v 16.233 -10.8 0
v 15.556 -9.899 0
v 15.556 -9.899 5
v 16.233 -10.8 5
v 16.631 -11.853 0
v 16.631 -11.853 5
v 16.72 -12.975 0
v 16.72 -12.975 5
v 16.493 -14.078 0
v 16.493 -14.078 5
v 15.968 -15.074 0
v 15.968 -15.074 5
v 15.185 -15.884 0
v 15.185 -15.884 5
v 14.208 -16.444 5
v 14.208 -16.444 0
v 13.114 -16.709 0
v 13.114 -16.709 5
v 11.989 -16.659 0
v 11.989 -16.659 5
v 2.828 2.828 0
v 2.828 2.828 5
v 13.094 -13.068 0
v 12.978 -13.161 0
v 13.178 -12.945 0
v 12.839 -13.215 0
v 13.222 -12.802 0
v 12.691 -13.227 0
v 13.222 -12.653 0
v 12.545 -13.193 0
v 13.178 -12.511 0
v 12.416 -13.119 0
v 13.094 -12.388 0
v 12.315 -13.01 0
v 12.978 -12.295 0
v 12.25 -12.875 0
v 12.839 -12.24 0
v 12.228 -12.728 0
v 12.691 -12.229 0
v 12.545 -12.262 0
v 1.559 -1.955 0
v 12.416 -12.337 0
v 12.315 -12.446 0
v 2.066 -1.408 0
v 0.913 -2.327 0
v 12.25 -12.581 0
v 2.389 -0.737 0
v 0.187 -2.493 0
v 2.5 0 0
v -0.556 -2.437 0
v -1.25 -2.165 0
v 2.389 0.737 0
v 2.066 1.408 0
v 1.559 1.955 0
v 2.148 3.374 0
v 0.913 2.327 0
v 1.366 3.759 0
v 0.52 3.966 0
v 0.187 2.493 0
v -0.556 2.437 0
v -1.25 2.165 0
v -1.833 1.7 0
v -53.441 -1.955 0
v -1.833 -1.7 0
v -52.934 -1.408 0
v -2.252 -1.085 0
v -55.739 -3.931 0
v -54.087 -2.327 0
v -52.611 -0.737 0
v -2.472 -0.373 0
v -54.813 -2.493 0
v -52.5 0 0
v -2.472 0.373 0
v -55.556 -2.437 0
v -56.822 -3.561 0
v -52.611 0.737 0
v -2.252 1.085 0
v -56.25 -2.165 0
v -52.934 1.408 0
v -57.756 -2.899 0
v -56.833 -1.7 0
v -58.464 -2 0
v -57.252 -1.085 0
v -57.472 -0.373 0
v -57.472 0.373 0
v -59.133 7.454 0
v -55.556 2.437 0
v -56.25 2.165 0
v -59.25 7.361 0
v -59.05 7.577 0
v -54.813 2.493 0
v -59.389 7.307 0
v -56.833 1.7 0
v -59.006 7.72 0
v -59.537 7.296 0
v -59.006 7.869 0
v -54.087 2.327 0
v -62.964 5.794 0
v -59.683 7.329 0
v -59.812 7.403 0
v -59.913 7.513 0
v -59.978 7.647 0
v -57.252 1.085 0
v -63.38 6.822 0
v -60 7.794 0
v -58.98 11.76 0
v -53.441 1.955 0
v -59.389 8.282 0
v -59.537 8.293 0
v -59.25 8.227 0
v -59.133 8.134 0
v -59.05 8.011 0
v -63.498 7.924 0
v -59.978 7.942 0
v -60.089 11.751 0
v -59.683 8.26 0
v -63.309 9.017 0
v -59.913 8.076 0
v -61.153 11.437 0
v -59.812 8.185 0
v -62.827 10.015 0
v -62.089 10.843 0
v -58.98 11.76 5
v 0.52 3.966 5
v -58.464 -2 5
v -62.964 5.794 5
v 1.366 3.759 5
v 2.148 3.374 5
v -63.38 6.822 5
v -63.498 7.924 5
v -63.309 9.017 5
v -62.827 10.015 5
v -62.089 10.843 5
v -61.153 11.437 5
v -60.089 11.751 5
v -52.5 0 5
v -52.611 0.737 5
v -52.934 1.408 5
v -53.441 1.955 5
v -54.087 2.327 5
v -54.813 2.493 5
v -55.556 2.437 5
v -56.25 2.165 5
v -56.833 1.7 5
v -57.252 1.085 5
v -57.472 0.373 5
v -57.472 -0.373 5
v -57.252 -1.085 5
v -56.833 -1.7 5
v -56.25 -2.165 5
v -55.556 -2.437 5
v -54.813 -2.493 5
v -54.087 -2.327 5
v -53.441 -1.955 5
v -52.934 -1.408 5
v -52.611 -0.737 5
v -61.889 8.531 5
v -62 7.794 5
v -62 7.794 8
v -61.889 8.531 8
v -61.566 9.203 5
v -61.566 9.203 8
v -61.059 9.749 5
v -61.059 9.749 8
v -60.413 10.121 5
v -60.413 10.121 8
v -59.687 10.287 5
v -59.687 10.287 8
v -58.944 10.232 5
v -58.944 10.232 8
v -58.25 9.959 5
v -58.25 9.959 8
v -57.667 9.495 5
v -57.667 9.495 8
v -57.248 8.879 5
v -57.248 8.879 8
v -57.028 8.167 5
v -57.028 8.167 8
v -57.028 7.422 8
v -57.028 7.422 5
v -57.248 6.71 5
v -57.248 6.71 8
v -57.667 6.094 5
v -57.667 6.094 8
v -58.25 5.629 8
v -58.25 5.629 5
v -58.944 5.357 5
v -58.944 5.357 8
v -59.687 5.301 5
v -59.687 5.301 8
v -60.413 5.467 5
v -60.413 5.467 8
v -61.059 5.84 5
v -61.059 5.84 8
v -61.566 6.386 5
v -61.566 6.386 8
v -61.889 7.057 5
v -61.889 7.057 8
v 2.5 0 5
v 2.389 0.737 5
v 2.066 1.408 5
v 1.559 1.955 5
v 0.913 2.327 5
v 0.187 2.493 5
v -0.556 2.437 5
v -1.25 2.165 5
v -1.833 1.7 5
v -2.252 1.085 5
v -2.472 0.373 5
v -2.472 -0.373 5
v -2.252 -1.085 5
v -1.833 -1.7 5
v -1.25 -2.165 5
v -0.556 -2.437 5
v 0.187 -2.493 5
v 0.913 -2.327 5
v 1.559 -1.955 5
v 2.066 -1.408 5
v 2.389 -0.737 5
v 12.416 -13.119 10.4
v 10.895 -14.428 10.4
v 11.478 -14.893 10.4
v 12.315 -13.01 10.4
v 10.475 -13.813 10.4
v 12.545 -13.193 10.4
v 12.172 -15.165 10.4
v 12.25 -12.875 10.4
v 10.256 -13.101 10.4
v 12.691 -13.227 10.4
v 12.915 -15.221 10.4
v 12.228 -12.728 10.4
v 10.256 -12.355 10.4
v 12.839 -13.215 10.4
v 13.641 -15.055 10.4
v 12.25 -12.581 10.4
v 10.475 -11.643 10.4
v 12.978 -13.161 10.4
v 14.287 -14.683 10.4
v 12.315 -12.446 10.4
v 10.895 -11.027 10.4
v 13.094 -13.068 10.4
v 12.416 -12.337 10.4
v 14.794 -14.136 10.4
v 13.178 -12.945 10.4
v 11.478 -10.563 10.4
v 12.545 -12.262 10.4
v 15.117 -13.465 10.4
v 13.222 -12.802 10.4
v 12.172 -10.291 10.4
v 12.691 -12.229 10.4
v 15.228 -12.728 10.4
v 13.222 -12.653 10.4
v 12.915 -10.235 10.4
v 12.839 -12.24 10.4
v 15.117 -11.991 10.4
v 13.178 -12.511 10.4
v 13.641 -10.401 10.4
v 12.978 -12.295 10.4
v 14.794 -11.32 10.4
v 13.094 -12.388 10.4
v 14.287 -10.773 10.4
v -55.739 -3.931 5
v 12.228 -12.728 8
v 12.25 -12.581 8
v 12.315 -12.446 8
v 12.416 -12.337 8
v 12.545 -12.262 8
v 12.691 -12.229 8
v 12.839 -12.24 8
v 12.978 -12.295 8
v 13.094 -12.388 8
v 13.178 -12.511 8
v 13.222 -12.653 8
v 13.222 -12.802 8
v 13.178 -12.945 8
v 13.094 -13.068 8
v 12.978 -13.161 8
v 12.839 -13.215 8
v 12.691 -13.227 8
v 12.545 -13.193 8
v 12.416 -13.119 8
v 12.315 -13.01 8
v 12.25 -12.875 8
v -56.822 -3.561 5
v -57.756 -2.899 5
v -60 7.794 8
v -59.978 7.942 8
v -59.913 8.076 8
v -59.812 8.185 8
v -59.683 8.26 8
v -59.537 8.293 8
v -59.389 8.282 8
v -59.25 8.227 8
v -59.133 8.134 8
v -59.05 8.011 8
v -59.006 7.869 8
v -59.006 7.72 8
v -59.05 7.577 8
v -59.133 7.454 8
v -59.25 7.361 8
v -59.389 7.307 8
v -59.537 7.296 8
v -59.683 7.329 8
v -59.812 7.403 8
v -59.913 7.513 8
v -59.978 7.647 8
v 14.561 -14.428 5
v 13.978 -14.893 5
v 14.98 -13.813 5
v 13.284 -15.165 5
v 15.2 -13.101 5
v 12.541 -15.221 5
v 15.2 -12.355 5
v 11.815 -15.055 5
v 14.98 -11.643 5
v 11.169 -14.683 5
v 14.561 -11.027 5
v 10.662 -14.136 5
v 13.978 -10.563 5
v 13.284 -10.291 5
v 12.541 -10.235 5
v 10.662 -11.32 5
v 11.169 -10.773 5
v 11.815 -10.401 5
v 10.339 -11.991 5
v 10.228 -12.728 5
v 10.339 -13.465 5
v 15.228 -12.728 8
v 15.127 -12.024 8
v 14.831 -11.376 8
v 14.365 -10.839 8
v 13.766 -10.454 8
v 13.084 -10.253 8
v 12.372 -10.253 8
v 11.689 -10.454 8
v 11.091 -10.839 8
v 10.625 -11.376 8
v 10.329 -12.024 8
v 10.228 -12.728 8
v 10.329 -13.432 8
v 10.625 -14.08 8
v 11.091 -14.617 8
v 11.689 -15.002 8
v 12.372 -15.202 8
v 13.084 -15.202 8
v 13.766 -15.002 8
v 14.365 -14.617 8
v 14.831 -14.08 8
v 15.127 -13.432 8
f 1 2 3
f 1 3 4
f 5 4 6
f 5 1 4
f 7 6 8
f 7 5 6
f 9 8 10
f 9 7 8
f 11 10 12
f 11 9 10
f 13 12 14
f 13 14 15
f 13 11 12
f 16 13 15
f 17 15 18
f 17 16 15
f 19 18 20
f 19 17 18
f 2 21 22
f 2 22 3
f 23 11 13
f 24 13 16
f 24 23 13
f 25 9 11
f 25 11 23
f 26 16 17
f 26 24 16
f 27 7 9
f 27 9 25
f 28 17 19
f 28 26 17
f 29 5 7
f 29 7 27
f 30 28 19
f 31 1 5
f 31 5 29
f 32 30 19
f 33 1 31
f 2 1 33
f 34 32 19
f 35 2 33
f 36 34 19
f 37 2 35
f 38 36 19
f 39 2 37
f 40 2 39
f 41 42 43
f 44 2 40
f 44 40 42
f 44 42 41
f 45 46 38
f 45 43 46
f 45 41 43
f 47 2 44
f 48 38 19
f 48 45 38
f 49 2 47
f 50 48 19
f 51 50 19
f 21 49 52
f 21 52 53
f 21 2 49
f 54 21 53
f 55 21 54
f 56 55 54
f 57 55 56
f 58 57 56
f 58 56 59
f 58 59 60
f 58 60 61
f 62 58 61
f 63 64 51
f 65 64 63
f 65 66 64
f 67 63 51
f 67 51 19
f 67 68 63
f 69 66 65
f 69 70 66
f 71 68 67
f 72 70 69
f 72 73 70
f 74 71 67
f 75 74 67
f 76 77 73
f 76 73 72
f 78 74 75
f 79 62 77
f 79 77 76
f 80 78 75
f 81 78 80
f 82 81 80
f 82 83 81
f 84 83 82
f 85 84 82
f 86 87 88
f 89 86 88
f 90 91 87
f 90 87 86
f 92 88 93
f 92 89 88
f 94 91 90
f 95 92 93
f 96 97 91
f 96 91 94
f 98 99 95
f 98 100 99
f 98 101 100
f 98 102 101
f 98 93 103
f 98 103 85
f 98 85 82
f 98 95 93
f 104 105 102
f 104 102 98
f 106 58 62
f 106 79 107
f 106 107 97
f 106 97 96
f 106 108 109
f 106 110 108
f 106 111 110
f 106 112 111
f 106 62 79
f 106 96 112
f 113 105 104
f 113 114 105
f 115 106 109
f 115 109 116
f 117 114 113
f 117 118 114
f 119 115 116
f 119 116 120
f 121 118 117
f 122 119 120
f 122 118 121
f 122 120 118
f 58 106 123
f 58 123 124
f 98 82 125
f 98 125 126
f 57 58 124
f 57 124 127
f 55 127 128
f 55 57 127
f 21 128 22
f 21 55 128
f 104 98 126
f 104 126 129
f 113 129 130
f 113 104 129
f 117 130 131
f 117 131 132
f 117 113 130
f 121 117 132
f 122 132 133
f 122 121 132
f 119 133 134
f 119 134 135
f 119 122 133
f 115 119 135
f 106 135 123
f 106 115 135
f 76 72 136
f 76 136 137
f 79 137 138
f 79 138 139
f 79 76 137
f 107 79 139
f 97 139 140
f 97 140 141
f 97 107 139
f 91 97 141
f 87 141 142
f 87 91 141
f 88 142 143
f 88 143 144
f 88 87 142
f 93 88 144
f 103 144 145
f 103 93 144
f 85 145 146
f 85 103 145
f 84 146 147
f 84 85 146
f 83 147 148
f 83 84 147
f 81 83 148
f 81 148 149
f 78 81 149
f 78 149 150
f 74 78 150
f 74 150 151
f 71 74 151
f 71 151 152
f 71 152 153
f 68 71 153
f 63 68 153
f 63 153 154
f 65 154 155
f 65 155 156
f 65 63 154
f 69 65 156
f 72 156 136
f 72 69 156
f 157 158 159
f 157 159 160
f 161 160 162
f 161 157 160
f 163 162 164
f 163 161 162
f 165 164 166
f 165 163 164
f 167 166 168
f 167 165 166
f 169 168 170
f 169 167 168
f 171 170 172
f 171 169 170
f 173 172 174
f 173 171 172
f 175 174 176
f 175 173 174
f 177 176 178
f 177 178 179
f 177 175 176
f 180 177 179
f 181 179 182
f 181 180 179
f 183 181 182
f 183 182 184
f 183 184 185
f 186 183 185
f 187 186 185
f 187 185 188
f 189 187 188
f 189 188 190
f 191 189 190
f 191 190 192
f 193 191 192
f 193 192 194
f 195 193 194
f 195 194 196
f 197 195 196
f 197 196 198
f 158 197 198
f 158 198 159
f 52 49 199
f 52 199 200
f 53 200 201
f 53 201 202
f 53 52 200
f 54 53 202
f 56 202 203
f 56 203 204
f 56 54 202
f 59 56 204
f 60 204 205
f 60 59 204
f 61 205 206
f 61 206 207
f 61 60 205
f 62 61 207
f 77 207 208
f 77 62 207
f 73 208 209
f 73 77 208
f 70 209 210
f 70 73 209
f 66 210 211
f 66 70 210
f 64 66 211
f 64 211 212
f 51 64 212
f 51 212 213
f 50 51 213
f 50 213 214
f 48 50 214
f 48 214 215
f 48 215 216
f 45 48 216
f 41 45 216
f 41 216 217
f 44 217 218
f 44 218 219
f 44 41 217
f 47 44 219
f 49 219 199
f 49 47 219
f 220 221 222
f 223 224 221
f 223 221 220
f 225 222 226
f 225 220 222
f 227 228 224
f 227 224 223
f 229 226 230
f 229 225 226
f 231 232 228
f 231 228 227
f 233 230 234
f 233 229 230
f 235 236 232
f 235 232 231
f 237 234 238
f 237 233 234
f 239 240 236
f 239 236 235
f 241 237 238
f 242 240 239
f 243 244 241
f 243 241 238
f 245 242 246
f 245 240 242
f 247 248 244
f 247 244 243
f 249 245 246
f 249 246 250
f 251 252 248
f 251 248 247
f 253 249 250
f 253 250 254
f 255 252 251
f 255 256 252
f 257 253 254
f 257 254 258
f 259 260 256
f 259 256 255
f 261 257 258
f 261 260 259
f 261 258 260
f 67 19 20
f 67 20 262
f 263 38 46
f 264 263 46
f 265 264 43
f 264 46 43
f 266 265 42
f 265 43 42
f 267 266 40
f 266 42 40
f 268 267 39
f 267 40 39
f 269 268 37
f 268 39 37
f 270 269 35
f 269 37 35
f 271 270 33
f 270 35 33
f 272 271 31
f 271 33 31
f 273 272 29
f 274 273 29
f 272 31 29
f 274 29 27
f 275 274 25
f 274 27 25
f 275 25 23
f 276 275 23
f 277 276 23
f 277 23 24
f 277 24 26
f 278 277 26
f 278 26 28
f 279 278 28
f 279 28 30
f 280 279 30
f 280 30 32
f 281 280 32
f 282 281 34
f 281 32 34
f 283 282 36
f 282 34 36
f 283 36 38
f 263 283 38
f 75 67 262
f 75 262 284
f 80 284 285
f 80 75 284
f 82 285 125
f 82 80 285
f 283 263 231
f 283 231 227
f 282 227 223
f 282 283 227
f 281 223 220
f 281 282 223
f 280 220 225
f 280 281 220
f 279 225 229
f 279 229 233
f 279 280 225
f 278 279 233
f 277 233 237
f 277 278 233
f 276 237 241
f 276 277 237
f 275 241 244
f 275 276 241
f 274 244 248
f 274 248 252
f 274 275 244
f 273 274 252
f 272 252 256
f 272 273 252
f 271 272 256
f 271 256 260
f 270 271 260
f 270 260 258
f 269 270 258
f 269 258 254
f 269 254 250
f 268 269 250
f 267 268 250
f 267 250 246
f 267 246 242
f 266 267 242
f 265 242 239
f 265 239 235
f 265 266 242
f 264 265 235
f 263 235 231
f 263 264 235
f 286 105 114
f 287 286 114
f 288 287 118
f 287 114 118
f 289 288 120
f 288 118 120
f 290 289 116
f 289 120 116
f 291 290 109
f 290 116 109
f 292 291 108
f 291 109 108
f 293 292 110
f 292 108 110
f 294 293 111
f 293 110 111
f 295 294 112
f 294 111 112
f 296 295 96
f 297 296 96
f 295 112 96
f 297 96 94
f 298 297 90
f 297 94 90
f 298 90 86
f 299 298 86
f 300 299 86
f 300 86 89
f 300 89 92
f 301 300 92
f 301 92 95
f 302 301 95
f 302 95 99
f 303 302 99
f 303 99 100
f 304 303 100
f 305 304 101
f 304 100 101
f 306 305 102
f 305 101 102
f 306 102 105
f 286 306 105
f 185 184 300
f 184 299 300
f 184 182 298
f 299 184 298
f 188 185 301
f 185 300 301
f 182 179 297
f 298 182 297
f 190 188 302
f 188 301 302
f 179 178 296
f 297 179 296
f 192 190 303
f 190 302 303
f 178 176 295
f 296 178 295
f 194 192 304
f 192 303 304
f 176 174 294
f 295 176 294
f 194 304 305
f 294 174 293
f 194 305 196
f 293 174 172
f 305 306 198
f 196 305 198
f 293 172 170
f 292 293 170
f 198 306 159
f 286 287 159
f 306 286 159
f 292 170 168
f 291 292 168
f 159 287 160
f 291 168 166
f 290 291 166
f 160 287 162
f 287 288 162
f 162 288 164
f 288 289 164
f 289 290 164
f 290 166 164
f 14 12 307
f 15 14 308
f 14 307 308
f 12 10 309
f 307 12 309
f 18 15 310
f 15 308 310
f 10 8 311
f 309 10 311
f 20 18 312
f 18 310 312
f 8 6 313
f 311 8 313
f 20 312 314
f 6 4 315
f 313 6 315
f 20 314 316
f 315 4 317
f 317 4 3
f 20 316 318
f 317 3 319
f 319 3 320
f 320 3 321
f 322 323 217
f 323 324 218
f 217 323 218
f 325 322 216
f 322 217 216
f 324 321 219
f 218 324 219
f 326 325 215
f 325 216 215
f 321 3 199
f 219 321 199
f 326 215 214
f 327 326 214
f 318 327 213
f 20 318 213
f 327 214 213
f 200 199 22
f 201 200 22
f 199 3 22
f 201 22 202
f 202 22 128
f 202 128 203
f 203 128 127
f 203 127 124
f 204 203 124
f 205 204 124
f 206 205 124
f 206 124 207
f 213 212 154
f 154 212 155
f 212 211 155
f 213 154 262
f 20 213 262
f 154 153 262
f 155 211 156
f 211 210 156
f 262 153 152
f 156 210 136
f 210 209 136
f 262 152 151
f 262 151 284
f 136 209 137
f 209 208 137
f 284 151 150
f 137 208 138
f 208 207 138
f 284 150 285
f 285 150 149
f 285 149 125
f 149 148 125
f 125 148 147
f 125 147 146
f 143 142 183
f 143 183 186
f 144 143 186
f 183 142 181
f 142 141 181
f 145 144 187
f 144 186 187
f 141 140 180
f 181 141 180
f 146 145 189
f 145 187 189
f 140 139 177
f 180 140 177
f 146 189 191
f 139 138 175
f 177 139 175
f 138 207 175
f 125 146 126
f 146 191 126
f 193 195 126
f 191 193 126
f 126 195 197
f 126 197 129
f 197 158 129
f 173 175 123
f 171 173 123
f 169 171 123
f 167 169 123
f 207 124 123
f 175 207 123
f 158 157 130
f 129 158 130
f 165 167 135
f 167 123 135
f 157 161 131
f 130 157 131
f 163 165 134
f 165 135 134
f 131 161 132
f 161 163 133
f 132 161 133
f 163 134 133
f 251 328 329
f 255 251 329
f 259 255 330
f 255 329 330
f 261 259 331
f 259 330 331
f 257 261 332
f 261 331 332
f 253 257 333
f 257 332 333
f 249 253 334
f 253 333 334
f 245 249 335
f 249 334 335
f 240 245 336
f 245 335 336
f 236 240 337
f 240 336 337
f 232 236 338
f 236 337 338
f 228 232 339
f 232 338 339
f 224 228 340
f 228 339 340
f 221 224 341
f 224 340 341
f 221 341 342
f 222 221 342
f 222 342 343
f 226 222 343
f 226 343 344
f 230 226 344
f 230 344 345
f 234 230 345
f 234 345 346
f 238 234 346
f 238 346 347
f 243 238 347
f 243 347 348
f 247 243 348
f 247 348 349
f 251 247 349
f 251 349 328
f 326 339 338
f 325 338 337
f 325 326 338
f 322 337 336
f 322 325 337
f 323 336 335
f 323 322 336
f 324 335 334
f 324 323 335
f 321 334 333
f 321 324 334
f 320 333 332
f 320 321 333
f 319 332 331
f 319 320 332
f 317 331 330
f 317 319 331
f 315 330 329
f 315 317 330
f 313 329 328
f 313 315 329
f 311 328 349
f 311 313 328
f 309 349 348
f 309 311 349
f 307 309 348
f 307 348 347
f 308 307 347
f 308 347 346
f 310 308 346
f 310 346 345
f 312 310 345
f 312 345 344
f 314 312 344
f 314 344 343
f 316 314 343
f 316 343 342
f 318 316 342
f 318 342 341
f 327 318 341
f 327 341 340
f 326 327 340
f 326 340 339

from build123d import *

# Parameters (mm, degrees)
SKETCH2_R           = 2.5
BOSS_EXTRUDE1_DEPTH = 5
SKETCH4_R           = 2.5
SKETCH4_R_2         = 0.5
BOSS_EXTRUDE3_DEPTH = 8
SKETCH5_R           = 2.5
SKETCH5_R_2         = 0.5
BOSS_EXTRUDE4_DEPTH = 2.4


with BuildPart() as part:
    # Sketch2 → Boss-Extrude1 (new body)
    with BuildSketch(Plane.XY):
        with BuildLine():
            Line((-58.980456911, 11.76034449), (0.519543089, 3.966115855))
            ThreePointArc((0.519543089, 3.966115855), (1.767996055, 3.588062144), (2.828427125, 2.828427125))
            Line((2.828427125, 2.828427125), (15.556349186, -9.899494937))
            ThreePointArc((15.556349186, -9.899494937), (16.265540761, -14.594805544), (11.989145433, -16.659106246))
            Line((11.989145433, -16.659106246), (-55.738776628, -3.931184185))
            ThreePointArc((-55.738776628, -3.931184185), (-57.312663934, -3.263676689), (-58.464101615, -2))
            Line((-58.464101615, -2), (-62.964101615, 5.794228634))
            ThreePointArc((-62.964101615, 5.794228634), (-62.826595982, 10.015435327), (-58.980456911, 11.76034449))
        make_face()
        with Locations((-55, 0)):
            Circle(SKETCH2_R, mode=Mode.SUBTRACT)
        with Locations((-59.5, 7.794228634)):
            Circle(SKETCH2_R, mode=Mode.SUBTRACT)
        Circle(SKETCH2_R, mode=Mode.SUBTRACT)
        with Locations((12.727922061, -12.727922061)):
            Circle(SKETCH2_R, mode=Mode.SUBTRACT)
    extrude(amount=BOSS_EXTRUDE1_DEPTH)

    # Sketch4 → Boss-Extrude3 (add)
    # profile 1 of 2: a face of its own
    with BuildSketch(Plane(origin=(0, 0, 0), x_dir=(-1, 0, 0), z_dir=(0, 0, -1))):
        with Locations((59.5, 7.794228634)):
            Circle(SKETCH4_R)
        with Locations((59.5, 7.794228634)):
            Circle(SKETCH4_R_2, mode=Mode.SUBTRACT)
    # profile 2 of 2: a face of its own
    with BuildSketch(Plane(origin=(0, 0, 0), x_dir=(-1, 0, 0), z_dir=(0, 0, -1))):
        with Locations((-12.727922061, -12.727922061)):
            Circle(SKETCH4_R)
        with Locations((-12.727922061, -12.727922061)):
            Circle(SKETCH4_R_2, mode=Mode.SUBTRACT)
    extrude(amount=-BOSS_EXTRUDE3_DEPTH)

    # Sketch5 → Boss-Extrude4 (add)
    with BuildSketch(Plane.XY.offset(8)):
        with Locations((12.727922061, -12.727922061)):
            Circle(SKETCH5_R)
        with Locations(Location((12.727922061, -12.727922061, 0), (0, 0, 180))):
            Circle(SKETCH5_R_2, mode=Mode.SUBTRACT)
    extrude(amount=BOSS_EXTRUDE4_DEPTH)


solid = part.part
